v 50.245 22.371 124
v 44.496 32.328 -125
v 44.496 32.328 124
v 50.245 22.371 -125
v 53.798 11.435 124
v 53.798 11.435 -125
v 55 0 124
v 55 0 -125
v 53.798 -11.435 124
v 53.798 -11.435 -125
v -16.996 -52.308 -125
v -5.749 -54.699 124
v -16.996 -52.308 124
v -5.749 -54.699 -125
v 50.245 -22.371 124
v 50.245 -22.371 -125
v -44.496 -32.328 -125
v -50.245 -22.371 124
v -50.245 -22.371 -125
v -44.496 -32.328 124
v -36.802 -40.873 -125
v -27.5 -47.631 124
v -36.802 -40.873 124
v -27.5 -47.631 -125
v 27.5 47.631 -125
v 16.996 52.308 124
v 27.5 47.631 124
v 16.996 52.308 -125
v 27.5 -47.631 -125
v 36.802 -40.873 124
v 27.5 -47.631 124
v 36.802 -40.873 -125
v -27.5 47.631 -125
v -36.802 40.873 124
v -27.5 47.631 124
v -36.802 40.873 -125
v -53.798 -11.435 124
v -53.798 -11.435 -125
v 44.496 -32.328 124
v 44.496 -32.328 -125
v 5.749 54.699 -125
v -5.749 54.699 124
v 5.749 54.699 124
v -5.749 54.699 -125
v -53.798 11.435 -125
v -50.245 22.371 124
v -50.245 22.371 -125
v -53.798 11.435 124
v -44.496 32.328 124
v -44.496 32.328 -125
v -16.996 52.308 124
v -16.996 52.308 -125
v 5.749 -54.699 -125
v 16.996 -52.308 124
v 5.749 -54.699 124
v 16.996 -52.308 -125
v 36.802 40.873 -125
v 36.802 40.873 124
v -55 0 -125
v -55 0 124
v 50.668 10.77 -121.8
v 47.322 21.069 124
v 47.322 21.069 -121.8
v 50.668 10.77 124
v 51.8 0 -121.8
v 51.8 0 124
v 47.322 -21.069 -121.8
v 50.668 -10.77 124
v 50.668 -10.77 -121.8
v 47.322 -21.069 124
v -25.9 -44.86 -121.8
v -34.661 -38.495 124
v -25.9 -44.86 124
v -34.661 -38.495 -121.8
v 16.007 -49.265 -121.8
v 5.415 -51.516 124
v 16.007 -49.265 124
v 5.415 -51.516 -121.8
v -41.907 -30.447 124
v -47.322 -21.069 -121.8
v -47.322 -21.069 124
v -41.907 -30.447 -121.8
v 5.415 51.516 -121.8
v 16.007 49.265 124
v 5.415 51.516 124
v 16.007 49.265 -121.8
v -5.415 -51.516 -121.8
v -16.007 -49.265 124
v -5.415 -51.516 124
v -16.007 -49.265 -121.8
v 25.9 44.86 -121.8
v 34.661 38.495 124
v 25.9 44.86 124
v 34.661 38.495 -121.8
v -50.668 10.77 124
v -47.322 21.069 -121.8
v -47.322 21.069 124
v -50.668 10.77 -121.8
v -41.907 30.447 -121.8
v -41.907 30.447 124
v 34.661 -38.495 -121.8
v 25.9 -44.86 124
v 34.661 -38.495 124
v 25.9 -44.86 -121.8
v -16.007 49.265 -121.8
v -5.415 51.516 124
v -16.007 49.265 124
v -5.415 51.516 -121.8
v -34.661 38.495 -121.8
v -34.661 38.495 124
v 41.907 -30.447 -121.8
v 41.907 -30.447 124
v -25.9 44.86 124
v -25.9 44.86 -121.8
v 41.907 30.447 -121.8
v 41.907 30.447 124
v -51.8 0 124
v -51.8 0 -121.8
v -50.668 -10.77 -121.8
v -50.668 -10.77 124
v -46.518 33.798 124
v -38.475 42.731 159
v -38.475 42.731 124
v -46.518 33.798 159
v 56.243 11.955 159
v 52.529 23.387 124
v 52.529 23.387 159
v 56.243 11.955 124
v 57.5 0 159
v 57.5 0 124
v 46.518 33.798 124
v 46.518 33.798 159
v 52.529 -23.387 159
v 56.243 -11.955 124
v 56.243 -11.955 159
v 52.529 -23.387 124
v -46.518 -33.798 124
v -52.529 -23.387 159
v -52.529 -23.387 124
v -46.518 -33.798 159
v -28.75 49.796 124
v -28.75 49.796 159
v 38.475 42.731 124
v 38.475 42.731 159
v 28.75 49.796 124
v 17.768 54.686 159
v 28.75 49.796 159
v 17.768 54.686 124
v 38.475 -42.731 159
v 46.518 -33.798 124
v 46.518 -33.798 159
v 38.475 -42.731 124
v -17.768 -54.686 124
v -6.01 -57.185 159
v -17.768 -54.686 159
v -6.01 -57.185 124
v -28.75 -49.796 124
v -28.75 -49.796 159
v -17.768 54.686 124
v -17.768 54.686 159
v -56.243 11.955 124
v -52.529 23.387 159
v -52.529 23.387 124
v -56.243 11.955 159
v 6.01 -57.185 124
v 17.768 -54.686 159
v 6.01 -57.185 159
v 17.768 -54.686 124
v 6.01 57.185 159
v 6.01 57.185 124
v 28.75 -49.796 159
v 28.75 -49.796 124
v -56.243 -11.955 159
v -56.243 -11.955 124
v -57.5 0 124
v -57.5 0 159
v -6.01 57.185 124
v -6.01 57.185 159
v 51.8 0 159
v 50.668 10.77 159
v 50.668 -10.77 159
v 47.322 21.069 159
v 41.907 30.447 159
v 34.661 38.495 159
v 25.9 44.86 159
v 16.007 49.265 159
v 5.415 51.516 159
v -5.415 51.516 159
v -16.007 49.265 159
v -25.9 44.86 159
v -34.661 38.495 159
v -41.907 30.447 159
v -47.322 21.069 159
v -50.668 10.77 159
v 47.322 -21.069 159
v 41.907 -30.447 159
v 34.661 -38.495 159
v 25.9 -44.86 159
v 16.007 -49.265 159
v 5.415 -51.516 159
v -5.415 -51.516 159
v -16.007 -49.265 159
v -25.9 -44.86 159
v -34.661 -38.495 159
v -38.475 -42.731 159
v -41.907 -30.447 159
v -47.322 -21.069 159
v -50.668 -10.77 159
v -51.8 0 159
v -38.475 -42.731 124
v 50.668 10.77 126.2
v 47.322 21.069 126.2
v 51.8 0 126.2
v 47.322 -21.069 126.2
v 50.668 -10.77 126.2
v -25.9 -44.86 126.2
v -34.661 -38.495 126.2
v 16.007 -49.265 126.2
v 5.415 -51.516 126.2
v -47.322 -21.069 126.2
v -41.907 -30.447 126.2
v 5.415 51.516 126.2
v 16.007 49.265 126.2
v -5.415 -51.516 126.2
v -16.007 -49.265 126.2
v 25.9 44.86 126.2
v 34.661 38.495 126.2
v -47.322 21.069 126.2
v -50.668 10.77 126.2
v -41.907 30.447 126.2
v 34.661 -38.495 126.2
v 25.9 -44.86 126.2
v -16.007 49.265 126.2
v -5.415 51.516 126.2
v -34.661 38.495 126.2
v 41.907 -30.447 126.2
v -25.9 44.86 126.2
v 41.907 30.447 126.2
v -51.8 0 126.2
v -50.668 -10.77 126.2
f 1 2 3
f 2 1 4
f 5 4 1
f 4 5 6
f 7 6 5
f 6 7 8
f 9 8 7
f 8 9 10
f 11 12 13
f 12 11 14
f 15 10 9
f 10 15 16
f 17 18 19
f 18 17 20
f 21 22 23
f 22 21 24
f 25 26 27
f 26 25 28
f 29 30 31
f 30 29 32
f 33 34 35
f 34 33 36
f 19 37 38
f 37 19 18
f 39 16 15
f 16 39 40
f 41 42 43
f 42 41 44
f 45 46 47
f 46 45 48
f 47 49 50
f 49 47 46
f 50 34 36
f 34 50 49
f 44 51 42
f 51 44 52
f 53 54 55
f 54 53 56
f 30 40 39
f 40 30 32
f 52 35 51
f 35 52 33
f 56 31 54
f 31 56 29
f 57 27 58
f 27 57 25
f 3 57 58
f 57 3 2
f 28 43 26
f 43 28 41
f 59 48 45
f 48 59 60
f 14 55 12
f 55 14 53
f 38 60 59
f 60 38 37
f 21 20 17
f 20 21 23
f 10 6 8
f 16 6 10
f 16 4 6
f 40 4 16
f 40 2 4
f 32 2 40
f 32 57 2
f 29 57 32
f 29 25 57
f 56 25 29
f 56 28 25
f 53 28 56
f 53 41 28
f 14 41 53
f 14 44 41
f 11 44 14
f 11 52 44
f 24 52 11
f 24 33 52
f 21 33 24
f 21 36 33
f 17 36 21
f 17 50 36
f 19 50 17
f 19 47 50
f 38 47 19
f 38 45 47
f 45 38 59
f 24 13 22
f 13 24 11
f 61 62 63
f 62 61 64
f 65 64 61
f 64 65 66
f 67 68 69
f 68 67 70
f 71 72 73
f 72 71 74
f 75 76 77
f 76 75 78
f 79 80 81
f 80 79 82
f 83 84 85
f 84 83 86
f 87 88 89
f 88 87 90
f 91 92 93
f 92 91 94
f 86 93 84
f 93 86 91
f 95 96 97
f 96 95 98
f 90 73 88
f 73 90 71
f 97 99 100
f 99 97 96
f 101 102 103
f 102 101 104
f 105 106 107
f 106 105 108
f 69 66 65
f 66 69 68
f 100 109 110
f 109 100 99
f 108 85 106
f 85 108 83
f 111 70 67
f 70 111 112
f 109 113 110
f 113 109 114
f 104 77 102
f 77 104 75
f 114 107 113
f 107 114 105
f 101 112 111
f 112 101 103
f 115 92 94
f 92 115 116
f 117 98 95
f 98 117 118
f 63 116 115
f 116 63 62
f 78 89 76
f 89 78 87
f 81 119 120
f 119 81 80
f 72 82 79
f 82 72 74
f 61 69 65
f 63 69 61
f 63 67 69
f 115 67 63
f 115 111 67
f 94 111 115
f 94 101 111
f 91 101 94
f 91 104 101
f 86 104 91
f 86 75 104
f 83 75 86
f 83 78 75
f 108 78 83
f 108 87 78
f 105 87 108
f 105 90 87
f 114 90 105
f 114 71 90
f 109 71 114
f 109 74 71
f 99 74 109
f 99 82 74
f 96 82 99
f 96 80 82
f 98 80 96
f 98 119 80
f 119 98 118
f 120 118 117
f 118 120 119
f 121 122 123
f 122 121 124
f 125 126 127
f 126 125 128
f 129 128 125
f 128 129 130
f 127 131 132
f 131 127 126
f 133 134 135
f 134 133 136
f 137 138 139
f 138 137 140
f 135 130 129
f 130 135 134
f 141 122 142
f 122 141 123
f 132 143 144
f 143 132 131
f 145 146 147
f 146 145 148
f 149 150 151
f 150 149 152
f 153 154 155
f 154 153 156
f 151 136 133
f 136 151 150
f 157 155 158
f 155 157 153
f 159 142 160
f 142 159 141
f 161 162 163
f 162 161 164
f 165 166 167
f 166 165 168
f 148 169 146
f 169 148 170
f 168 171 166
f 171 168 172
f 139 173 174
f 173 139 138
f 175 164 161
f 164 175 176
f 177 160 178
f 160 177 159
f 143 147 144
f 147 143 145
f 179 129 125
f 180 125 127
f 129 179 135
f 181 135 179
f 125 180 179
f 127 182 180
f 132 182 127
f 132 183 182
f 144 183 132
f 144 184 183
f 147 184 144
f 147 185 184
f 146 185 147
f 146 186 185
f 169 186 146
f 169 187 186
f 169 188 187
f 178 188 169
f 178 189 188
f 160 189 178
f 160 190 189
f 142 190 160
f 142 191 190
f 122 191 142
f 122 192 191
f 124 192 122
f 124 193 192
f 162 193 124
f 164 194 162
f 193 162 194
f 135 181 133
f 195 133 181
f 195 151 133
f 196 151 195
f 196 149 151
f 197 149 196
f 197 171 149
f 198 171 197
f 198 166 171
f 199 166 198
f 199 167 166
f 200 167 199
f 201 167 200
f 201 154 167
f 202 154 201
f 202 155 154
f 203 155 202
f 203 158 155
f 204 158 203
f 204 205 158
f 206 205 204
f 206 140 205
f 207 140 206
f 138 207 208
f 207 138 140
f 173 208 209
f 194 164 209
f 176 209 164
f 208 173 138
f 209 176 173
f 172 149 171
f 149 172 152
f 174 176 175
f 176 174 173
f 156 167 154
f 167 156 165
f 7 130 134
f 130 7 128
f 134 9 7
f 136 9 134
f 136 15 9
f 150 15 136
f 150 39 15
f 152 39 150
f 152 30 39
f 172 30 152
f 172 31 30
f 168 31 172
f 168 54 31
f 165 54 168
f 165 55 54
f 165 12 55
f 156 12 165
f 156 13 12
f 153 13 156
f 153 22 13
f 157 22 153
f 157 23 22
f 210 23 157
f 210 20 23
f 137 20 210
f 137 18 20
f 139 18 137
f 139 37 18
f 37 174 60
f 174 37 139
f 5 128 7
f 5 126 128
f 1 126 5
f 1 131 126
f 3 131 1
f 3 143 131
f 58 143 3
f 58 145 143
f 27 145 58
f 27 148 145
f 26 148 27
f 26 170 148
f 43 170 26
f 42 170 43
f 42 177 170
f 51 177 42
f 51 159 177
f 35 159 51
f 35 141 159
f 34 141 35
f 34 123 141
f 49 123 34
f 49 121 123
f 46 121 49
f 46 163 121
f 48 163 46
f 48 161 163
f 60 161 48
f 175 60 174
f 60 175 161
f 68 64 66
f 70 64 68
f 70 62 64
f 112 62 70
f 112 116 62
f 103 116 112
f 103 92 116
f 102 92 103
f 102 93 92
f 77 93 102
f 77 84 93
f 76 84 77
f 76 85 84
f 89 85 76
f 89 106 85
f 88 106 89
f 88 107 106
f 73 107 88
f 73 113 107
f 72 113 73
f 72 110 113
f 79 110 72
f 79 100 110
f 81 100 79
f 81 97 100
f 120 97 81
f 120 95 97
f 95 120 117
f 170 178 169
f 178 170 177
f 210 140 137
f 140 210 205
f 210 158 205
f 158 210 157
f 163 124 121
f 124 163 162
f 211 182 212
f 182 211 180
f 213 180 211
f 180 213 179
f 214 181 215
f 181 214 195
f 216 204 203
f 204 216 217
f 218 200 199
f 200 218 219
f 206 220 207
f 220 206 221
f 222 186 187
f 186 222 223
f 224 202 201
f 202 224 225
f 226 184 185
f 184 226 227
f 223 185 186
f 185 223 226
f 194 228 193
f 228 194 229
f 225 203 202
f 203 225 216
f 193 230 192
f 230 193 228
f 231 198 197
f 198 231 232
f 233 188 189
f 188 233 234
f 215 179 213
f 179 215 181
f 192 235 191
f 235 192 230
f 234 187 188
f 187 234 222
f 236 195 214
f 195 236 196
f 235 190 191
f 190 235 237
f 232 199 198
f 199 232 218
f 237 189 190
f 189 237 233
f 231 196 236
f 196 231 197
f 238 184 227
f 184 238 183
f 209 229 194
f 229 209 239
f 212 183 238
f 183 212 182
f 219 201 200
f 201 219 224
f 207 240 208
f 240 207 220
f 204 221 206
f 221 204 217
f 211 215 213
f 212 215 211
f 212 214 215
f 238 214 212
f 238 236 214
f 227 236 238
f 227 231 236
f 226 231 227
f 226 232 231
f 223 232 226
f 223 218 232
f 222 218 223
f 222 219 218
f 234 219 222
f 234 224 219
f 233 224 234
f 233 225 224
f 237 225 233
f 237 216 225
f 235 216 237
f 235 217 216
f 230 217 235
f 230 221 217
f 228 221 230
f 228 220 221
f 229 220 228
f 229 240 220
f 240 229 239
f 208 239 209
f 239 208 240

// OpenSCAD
// Parameters
pipe_standard = 1; //[1:1:1]
nominal_diameter_mm = 110; //[55:220:1]
length_mm = 250; //[125:500:1]
include_end_fitting = 1; //[0:1:1]
od_mm = 110; //[55:220:1]
wall_thickness_mm = 3.2; //[1.6:6.4:0.1]
overlap_mm = 1; //[0.5:2:0.1]
fitting_length_mm = 35; //[15:70:1]
fitting_wall_extra_mm = 2.5; //[1:6:0.1]

// Module for the HT Pipe
module ht_pipe() {
  color([0.85, 0.85, 0.8]) { // PVC color
    // Outer pipe
    difference() {
      cylinder(h=length_mm, r=od_mm/2, center=true);
      // Inner void
      translate([0, 0, wall_thickness_mm])
        cylinder(h=length_mm, r=od_mm/2 - wall_thickness_mm, center=true);
    }
    
    // End fitting
    if (include_end_fitting) {
      difference() {
        translate([0, 0, length_mm/2 + fitting_length_mm/2 - overlap_mm])
          cylinder(h=fitting_length_mm, r=od_mm/2 + fitting_wall_extra_mm, center=true);
        translate([0, 0, length_mm/2 + fitting_length_mm/2 - overlap_mm + wall_thickness_mm])
          cylinder(h=fitting_length_mm + 2*overlap_mm, r=od_mm/2 - wall_thickness_mm, center=true);
      }
    }
  }
}

// Assembly
module assembly() {
  ht_pipe();
}

assembly();
